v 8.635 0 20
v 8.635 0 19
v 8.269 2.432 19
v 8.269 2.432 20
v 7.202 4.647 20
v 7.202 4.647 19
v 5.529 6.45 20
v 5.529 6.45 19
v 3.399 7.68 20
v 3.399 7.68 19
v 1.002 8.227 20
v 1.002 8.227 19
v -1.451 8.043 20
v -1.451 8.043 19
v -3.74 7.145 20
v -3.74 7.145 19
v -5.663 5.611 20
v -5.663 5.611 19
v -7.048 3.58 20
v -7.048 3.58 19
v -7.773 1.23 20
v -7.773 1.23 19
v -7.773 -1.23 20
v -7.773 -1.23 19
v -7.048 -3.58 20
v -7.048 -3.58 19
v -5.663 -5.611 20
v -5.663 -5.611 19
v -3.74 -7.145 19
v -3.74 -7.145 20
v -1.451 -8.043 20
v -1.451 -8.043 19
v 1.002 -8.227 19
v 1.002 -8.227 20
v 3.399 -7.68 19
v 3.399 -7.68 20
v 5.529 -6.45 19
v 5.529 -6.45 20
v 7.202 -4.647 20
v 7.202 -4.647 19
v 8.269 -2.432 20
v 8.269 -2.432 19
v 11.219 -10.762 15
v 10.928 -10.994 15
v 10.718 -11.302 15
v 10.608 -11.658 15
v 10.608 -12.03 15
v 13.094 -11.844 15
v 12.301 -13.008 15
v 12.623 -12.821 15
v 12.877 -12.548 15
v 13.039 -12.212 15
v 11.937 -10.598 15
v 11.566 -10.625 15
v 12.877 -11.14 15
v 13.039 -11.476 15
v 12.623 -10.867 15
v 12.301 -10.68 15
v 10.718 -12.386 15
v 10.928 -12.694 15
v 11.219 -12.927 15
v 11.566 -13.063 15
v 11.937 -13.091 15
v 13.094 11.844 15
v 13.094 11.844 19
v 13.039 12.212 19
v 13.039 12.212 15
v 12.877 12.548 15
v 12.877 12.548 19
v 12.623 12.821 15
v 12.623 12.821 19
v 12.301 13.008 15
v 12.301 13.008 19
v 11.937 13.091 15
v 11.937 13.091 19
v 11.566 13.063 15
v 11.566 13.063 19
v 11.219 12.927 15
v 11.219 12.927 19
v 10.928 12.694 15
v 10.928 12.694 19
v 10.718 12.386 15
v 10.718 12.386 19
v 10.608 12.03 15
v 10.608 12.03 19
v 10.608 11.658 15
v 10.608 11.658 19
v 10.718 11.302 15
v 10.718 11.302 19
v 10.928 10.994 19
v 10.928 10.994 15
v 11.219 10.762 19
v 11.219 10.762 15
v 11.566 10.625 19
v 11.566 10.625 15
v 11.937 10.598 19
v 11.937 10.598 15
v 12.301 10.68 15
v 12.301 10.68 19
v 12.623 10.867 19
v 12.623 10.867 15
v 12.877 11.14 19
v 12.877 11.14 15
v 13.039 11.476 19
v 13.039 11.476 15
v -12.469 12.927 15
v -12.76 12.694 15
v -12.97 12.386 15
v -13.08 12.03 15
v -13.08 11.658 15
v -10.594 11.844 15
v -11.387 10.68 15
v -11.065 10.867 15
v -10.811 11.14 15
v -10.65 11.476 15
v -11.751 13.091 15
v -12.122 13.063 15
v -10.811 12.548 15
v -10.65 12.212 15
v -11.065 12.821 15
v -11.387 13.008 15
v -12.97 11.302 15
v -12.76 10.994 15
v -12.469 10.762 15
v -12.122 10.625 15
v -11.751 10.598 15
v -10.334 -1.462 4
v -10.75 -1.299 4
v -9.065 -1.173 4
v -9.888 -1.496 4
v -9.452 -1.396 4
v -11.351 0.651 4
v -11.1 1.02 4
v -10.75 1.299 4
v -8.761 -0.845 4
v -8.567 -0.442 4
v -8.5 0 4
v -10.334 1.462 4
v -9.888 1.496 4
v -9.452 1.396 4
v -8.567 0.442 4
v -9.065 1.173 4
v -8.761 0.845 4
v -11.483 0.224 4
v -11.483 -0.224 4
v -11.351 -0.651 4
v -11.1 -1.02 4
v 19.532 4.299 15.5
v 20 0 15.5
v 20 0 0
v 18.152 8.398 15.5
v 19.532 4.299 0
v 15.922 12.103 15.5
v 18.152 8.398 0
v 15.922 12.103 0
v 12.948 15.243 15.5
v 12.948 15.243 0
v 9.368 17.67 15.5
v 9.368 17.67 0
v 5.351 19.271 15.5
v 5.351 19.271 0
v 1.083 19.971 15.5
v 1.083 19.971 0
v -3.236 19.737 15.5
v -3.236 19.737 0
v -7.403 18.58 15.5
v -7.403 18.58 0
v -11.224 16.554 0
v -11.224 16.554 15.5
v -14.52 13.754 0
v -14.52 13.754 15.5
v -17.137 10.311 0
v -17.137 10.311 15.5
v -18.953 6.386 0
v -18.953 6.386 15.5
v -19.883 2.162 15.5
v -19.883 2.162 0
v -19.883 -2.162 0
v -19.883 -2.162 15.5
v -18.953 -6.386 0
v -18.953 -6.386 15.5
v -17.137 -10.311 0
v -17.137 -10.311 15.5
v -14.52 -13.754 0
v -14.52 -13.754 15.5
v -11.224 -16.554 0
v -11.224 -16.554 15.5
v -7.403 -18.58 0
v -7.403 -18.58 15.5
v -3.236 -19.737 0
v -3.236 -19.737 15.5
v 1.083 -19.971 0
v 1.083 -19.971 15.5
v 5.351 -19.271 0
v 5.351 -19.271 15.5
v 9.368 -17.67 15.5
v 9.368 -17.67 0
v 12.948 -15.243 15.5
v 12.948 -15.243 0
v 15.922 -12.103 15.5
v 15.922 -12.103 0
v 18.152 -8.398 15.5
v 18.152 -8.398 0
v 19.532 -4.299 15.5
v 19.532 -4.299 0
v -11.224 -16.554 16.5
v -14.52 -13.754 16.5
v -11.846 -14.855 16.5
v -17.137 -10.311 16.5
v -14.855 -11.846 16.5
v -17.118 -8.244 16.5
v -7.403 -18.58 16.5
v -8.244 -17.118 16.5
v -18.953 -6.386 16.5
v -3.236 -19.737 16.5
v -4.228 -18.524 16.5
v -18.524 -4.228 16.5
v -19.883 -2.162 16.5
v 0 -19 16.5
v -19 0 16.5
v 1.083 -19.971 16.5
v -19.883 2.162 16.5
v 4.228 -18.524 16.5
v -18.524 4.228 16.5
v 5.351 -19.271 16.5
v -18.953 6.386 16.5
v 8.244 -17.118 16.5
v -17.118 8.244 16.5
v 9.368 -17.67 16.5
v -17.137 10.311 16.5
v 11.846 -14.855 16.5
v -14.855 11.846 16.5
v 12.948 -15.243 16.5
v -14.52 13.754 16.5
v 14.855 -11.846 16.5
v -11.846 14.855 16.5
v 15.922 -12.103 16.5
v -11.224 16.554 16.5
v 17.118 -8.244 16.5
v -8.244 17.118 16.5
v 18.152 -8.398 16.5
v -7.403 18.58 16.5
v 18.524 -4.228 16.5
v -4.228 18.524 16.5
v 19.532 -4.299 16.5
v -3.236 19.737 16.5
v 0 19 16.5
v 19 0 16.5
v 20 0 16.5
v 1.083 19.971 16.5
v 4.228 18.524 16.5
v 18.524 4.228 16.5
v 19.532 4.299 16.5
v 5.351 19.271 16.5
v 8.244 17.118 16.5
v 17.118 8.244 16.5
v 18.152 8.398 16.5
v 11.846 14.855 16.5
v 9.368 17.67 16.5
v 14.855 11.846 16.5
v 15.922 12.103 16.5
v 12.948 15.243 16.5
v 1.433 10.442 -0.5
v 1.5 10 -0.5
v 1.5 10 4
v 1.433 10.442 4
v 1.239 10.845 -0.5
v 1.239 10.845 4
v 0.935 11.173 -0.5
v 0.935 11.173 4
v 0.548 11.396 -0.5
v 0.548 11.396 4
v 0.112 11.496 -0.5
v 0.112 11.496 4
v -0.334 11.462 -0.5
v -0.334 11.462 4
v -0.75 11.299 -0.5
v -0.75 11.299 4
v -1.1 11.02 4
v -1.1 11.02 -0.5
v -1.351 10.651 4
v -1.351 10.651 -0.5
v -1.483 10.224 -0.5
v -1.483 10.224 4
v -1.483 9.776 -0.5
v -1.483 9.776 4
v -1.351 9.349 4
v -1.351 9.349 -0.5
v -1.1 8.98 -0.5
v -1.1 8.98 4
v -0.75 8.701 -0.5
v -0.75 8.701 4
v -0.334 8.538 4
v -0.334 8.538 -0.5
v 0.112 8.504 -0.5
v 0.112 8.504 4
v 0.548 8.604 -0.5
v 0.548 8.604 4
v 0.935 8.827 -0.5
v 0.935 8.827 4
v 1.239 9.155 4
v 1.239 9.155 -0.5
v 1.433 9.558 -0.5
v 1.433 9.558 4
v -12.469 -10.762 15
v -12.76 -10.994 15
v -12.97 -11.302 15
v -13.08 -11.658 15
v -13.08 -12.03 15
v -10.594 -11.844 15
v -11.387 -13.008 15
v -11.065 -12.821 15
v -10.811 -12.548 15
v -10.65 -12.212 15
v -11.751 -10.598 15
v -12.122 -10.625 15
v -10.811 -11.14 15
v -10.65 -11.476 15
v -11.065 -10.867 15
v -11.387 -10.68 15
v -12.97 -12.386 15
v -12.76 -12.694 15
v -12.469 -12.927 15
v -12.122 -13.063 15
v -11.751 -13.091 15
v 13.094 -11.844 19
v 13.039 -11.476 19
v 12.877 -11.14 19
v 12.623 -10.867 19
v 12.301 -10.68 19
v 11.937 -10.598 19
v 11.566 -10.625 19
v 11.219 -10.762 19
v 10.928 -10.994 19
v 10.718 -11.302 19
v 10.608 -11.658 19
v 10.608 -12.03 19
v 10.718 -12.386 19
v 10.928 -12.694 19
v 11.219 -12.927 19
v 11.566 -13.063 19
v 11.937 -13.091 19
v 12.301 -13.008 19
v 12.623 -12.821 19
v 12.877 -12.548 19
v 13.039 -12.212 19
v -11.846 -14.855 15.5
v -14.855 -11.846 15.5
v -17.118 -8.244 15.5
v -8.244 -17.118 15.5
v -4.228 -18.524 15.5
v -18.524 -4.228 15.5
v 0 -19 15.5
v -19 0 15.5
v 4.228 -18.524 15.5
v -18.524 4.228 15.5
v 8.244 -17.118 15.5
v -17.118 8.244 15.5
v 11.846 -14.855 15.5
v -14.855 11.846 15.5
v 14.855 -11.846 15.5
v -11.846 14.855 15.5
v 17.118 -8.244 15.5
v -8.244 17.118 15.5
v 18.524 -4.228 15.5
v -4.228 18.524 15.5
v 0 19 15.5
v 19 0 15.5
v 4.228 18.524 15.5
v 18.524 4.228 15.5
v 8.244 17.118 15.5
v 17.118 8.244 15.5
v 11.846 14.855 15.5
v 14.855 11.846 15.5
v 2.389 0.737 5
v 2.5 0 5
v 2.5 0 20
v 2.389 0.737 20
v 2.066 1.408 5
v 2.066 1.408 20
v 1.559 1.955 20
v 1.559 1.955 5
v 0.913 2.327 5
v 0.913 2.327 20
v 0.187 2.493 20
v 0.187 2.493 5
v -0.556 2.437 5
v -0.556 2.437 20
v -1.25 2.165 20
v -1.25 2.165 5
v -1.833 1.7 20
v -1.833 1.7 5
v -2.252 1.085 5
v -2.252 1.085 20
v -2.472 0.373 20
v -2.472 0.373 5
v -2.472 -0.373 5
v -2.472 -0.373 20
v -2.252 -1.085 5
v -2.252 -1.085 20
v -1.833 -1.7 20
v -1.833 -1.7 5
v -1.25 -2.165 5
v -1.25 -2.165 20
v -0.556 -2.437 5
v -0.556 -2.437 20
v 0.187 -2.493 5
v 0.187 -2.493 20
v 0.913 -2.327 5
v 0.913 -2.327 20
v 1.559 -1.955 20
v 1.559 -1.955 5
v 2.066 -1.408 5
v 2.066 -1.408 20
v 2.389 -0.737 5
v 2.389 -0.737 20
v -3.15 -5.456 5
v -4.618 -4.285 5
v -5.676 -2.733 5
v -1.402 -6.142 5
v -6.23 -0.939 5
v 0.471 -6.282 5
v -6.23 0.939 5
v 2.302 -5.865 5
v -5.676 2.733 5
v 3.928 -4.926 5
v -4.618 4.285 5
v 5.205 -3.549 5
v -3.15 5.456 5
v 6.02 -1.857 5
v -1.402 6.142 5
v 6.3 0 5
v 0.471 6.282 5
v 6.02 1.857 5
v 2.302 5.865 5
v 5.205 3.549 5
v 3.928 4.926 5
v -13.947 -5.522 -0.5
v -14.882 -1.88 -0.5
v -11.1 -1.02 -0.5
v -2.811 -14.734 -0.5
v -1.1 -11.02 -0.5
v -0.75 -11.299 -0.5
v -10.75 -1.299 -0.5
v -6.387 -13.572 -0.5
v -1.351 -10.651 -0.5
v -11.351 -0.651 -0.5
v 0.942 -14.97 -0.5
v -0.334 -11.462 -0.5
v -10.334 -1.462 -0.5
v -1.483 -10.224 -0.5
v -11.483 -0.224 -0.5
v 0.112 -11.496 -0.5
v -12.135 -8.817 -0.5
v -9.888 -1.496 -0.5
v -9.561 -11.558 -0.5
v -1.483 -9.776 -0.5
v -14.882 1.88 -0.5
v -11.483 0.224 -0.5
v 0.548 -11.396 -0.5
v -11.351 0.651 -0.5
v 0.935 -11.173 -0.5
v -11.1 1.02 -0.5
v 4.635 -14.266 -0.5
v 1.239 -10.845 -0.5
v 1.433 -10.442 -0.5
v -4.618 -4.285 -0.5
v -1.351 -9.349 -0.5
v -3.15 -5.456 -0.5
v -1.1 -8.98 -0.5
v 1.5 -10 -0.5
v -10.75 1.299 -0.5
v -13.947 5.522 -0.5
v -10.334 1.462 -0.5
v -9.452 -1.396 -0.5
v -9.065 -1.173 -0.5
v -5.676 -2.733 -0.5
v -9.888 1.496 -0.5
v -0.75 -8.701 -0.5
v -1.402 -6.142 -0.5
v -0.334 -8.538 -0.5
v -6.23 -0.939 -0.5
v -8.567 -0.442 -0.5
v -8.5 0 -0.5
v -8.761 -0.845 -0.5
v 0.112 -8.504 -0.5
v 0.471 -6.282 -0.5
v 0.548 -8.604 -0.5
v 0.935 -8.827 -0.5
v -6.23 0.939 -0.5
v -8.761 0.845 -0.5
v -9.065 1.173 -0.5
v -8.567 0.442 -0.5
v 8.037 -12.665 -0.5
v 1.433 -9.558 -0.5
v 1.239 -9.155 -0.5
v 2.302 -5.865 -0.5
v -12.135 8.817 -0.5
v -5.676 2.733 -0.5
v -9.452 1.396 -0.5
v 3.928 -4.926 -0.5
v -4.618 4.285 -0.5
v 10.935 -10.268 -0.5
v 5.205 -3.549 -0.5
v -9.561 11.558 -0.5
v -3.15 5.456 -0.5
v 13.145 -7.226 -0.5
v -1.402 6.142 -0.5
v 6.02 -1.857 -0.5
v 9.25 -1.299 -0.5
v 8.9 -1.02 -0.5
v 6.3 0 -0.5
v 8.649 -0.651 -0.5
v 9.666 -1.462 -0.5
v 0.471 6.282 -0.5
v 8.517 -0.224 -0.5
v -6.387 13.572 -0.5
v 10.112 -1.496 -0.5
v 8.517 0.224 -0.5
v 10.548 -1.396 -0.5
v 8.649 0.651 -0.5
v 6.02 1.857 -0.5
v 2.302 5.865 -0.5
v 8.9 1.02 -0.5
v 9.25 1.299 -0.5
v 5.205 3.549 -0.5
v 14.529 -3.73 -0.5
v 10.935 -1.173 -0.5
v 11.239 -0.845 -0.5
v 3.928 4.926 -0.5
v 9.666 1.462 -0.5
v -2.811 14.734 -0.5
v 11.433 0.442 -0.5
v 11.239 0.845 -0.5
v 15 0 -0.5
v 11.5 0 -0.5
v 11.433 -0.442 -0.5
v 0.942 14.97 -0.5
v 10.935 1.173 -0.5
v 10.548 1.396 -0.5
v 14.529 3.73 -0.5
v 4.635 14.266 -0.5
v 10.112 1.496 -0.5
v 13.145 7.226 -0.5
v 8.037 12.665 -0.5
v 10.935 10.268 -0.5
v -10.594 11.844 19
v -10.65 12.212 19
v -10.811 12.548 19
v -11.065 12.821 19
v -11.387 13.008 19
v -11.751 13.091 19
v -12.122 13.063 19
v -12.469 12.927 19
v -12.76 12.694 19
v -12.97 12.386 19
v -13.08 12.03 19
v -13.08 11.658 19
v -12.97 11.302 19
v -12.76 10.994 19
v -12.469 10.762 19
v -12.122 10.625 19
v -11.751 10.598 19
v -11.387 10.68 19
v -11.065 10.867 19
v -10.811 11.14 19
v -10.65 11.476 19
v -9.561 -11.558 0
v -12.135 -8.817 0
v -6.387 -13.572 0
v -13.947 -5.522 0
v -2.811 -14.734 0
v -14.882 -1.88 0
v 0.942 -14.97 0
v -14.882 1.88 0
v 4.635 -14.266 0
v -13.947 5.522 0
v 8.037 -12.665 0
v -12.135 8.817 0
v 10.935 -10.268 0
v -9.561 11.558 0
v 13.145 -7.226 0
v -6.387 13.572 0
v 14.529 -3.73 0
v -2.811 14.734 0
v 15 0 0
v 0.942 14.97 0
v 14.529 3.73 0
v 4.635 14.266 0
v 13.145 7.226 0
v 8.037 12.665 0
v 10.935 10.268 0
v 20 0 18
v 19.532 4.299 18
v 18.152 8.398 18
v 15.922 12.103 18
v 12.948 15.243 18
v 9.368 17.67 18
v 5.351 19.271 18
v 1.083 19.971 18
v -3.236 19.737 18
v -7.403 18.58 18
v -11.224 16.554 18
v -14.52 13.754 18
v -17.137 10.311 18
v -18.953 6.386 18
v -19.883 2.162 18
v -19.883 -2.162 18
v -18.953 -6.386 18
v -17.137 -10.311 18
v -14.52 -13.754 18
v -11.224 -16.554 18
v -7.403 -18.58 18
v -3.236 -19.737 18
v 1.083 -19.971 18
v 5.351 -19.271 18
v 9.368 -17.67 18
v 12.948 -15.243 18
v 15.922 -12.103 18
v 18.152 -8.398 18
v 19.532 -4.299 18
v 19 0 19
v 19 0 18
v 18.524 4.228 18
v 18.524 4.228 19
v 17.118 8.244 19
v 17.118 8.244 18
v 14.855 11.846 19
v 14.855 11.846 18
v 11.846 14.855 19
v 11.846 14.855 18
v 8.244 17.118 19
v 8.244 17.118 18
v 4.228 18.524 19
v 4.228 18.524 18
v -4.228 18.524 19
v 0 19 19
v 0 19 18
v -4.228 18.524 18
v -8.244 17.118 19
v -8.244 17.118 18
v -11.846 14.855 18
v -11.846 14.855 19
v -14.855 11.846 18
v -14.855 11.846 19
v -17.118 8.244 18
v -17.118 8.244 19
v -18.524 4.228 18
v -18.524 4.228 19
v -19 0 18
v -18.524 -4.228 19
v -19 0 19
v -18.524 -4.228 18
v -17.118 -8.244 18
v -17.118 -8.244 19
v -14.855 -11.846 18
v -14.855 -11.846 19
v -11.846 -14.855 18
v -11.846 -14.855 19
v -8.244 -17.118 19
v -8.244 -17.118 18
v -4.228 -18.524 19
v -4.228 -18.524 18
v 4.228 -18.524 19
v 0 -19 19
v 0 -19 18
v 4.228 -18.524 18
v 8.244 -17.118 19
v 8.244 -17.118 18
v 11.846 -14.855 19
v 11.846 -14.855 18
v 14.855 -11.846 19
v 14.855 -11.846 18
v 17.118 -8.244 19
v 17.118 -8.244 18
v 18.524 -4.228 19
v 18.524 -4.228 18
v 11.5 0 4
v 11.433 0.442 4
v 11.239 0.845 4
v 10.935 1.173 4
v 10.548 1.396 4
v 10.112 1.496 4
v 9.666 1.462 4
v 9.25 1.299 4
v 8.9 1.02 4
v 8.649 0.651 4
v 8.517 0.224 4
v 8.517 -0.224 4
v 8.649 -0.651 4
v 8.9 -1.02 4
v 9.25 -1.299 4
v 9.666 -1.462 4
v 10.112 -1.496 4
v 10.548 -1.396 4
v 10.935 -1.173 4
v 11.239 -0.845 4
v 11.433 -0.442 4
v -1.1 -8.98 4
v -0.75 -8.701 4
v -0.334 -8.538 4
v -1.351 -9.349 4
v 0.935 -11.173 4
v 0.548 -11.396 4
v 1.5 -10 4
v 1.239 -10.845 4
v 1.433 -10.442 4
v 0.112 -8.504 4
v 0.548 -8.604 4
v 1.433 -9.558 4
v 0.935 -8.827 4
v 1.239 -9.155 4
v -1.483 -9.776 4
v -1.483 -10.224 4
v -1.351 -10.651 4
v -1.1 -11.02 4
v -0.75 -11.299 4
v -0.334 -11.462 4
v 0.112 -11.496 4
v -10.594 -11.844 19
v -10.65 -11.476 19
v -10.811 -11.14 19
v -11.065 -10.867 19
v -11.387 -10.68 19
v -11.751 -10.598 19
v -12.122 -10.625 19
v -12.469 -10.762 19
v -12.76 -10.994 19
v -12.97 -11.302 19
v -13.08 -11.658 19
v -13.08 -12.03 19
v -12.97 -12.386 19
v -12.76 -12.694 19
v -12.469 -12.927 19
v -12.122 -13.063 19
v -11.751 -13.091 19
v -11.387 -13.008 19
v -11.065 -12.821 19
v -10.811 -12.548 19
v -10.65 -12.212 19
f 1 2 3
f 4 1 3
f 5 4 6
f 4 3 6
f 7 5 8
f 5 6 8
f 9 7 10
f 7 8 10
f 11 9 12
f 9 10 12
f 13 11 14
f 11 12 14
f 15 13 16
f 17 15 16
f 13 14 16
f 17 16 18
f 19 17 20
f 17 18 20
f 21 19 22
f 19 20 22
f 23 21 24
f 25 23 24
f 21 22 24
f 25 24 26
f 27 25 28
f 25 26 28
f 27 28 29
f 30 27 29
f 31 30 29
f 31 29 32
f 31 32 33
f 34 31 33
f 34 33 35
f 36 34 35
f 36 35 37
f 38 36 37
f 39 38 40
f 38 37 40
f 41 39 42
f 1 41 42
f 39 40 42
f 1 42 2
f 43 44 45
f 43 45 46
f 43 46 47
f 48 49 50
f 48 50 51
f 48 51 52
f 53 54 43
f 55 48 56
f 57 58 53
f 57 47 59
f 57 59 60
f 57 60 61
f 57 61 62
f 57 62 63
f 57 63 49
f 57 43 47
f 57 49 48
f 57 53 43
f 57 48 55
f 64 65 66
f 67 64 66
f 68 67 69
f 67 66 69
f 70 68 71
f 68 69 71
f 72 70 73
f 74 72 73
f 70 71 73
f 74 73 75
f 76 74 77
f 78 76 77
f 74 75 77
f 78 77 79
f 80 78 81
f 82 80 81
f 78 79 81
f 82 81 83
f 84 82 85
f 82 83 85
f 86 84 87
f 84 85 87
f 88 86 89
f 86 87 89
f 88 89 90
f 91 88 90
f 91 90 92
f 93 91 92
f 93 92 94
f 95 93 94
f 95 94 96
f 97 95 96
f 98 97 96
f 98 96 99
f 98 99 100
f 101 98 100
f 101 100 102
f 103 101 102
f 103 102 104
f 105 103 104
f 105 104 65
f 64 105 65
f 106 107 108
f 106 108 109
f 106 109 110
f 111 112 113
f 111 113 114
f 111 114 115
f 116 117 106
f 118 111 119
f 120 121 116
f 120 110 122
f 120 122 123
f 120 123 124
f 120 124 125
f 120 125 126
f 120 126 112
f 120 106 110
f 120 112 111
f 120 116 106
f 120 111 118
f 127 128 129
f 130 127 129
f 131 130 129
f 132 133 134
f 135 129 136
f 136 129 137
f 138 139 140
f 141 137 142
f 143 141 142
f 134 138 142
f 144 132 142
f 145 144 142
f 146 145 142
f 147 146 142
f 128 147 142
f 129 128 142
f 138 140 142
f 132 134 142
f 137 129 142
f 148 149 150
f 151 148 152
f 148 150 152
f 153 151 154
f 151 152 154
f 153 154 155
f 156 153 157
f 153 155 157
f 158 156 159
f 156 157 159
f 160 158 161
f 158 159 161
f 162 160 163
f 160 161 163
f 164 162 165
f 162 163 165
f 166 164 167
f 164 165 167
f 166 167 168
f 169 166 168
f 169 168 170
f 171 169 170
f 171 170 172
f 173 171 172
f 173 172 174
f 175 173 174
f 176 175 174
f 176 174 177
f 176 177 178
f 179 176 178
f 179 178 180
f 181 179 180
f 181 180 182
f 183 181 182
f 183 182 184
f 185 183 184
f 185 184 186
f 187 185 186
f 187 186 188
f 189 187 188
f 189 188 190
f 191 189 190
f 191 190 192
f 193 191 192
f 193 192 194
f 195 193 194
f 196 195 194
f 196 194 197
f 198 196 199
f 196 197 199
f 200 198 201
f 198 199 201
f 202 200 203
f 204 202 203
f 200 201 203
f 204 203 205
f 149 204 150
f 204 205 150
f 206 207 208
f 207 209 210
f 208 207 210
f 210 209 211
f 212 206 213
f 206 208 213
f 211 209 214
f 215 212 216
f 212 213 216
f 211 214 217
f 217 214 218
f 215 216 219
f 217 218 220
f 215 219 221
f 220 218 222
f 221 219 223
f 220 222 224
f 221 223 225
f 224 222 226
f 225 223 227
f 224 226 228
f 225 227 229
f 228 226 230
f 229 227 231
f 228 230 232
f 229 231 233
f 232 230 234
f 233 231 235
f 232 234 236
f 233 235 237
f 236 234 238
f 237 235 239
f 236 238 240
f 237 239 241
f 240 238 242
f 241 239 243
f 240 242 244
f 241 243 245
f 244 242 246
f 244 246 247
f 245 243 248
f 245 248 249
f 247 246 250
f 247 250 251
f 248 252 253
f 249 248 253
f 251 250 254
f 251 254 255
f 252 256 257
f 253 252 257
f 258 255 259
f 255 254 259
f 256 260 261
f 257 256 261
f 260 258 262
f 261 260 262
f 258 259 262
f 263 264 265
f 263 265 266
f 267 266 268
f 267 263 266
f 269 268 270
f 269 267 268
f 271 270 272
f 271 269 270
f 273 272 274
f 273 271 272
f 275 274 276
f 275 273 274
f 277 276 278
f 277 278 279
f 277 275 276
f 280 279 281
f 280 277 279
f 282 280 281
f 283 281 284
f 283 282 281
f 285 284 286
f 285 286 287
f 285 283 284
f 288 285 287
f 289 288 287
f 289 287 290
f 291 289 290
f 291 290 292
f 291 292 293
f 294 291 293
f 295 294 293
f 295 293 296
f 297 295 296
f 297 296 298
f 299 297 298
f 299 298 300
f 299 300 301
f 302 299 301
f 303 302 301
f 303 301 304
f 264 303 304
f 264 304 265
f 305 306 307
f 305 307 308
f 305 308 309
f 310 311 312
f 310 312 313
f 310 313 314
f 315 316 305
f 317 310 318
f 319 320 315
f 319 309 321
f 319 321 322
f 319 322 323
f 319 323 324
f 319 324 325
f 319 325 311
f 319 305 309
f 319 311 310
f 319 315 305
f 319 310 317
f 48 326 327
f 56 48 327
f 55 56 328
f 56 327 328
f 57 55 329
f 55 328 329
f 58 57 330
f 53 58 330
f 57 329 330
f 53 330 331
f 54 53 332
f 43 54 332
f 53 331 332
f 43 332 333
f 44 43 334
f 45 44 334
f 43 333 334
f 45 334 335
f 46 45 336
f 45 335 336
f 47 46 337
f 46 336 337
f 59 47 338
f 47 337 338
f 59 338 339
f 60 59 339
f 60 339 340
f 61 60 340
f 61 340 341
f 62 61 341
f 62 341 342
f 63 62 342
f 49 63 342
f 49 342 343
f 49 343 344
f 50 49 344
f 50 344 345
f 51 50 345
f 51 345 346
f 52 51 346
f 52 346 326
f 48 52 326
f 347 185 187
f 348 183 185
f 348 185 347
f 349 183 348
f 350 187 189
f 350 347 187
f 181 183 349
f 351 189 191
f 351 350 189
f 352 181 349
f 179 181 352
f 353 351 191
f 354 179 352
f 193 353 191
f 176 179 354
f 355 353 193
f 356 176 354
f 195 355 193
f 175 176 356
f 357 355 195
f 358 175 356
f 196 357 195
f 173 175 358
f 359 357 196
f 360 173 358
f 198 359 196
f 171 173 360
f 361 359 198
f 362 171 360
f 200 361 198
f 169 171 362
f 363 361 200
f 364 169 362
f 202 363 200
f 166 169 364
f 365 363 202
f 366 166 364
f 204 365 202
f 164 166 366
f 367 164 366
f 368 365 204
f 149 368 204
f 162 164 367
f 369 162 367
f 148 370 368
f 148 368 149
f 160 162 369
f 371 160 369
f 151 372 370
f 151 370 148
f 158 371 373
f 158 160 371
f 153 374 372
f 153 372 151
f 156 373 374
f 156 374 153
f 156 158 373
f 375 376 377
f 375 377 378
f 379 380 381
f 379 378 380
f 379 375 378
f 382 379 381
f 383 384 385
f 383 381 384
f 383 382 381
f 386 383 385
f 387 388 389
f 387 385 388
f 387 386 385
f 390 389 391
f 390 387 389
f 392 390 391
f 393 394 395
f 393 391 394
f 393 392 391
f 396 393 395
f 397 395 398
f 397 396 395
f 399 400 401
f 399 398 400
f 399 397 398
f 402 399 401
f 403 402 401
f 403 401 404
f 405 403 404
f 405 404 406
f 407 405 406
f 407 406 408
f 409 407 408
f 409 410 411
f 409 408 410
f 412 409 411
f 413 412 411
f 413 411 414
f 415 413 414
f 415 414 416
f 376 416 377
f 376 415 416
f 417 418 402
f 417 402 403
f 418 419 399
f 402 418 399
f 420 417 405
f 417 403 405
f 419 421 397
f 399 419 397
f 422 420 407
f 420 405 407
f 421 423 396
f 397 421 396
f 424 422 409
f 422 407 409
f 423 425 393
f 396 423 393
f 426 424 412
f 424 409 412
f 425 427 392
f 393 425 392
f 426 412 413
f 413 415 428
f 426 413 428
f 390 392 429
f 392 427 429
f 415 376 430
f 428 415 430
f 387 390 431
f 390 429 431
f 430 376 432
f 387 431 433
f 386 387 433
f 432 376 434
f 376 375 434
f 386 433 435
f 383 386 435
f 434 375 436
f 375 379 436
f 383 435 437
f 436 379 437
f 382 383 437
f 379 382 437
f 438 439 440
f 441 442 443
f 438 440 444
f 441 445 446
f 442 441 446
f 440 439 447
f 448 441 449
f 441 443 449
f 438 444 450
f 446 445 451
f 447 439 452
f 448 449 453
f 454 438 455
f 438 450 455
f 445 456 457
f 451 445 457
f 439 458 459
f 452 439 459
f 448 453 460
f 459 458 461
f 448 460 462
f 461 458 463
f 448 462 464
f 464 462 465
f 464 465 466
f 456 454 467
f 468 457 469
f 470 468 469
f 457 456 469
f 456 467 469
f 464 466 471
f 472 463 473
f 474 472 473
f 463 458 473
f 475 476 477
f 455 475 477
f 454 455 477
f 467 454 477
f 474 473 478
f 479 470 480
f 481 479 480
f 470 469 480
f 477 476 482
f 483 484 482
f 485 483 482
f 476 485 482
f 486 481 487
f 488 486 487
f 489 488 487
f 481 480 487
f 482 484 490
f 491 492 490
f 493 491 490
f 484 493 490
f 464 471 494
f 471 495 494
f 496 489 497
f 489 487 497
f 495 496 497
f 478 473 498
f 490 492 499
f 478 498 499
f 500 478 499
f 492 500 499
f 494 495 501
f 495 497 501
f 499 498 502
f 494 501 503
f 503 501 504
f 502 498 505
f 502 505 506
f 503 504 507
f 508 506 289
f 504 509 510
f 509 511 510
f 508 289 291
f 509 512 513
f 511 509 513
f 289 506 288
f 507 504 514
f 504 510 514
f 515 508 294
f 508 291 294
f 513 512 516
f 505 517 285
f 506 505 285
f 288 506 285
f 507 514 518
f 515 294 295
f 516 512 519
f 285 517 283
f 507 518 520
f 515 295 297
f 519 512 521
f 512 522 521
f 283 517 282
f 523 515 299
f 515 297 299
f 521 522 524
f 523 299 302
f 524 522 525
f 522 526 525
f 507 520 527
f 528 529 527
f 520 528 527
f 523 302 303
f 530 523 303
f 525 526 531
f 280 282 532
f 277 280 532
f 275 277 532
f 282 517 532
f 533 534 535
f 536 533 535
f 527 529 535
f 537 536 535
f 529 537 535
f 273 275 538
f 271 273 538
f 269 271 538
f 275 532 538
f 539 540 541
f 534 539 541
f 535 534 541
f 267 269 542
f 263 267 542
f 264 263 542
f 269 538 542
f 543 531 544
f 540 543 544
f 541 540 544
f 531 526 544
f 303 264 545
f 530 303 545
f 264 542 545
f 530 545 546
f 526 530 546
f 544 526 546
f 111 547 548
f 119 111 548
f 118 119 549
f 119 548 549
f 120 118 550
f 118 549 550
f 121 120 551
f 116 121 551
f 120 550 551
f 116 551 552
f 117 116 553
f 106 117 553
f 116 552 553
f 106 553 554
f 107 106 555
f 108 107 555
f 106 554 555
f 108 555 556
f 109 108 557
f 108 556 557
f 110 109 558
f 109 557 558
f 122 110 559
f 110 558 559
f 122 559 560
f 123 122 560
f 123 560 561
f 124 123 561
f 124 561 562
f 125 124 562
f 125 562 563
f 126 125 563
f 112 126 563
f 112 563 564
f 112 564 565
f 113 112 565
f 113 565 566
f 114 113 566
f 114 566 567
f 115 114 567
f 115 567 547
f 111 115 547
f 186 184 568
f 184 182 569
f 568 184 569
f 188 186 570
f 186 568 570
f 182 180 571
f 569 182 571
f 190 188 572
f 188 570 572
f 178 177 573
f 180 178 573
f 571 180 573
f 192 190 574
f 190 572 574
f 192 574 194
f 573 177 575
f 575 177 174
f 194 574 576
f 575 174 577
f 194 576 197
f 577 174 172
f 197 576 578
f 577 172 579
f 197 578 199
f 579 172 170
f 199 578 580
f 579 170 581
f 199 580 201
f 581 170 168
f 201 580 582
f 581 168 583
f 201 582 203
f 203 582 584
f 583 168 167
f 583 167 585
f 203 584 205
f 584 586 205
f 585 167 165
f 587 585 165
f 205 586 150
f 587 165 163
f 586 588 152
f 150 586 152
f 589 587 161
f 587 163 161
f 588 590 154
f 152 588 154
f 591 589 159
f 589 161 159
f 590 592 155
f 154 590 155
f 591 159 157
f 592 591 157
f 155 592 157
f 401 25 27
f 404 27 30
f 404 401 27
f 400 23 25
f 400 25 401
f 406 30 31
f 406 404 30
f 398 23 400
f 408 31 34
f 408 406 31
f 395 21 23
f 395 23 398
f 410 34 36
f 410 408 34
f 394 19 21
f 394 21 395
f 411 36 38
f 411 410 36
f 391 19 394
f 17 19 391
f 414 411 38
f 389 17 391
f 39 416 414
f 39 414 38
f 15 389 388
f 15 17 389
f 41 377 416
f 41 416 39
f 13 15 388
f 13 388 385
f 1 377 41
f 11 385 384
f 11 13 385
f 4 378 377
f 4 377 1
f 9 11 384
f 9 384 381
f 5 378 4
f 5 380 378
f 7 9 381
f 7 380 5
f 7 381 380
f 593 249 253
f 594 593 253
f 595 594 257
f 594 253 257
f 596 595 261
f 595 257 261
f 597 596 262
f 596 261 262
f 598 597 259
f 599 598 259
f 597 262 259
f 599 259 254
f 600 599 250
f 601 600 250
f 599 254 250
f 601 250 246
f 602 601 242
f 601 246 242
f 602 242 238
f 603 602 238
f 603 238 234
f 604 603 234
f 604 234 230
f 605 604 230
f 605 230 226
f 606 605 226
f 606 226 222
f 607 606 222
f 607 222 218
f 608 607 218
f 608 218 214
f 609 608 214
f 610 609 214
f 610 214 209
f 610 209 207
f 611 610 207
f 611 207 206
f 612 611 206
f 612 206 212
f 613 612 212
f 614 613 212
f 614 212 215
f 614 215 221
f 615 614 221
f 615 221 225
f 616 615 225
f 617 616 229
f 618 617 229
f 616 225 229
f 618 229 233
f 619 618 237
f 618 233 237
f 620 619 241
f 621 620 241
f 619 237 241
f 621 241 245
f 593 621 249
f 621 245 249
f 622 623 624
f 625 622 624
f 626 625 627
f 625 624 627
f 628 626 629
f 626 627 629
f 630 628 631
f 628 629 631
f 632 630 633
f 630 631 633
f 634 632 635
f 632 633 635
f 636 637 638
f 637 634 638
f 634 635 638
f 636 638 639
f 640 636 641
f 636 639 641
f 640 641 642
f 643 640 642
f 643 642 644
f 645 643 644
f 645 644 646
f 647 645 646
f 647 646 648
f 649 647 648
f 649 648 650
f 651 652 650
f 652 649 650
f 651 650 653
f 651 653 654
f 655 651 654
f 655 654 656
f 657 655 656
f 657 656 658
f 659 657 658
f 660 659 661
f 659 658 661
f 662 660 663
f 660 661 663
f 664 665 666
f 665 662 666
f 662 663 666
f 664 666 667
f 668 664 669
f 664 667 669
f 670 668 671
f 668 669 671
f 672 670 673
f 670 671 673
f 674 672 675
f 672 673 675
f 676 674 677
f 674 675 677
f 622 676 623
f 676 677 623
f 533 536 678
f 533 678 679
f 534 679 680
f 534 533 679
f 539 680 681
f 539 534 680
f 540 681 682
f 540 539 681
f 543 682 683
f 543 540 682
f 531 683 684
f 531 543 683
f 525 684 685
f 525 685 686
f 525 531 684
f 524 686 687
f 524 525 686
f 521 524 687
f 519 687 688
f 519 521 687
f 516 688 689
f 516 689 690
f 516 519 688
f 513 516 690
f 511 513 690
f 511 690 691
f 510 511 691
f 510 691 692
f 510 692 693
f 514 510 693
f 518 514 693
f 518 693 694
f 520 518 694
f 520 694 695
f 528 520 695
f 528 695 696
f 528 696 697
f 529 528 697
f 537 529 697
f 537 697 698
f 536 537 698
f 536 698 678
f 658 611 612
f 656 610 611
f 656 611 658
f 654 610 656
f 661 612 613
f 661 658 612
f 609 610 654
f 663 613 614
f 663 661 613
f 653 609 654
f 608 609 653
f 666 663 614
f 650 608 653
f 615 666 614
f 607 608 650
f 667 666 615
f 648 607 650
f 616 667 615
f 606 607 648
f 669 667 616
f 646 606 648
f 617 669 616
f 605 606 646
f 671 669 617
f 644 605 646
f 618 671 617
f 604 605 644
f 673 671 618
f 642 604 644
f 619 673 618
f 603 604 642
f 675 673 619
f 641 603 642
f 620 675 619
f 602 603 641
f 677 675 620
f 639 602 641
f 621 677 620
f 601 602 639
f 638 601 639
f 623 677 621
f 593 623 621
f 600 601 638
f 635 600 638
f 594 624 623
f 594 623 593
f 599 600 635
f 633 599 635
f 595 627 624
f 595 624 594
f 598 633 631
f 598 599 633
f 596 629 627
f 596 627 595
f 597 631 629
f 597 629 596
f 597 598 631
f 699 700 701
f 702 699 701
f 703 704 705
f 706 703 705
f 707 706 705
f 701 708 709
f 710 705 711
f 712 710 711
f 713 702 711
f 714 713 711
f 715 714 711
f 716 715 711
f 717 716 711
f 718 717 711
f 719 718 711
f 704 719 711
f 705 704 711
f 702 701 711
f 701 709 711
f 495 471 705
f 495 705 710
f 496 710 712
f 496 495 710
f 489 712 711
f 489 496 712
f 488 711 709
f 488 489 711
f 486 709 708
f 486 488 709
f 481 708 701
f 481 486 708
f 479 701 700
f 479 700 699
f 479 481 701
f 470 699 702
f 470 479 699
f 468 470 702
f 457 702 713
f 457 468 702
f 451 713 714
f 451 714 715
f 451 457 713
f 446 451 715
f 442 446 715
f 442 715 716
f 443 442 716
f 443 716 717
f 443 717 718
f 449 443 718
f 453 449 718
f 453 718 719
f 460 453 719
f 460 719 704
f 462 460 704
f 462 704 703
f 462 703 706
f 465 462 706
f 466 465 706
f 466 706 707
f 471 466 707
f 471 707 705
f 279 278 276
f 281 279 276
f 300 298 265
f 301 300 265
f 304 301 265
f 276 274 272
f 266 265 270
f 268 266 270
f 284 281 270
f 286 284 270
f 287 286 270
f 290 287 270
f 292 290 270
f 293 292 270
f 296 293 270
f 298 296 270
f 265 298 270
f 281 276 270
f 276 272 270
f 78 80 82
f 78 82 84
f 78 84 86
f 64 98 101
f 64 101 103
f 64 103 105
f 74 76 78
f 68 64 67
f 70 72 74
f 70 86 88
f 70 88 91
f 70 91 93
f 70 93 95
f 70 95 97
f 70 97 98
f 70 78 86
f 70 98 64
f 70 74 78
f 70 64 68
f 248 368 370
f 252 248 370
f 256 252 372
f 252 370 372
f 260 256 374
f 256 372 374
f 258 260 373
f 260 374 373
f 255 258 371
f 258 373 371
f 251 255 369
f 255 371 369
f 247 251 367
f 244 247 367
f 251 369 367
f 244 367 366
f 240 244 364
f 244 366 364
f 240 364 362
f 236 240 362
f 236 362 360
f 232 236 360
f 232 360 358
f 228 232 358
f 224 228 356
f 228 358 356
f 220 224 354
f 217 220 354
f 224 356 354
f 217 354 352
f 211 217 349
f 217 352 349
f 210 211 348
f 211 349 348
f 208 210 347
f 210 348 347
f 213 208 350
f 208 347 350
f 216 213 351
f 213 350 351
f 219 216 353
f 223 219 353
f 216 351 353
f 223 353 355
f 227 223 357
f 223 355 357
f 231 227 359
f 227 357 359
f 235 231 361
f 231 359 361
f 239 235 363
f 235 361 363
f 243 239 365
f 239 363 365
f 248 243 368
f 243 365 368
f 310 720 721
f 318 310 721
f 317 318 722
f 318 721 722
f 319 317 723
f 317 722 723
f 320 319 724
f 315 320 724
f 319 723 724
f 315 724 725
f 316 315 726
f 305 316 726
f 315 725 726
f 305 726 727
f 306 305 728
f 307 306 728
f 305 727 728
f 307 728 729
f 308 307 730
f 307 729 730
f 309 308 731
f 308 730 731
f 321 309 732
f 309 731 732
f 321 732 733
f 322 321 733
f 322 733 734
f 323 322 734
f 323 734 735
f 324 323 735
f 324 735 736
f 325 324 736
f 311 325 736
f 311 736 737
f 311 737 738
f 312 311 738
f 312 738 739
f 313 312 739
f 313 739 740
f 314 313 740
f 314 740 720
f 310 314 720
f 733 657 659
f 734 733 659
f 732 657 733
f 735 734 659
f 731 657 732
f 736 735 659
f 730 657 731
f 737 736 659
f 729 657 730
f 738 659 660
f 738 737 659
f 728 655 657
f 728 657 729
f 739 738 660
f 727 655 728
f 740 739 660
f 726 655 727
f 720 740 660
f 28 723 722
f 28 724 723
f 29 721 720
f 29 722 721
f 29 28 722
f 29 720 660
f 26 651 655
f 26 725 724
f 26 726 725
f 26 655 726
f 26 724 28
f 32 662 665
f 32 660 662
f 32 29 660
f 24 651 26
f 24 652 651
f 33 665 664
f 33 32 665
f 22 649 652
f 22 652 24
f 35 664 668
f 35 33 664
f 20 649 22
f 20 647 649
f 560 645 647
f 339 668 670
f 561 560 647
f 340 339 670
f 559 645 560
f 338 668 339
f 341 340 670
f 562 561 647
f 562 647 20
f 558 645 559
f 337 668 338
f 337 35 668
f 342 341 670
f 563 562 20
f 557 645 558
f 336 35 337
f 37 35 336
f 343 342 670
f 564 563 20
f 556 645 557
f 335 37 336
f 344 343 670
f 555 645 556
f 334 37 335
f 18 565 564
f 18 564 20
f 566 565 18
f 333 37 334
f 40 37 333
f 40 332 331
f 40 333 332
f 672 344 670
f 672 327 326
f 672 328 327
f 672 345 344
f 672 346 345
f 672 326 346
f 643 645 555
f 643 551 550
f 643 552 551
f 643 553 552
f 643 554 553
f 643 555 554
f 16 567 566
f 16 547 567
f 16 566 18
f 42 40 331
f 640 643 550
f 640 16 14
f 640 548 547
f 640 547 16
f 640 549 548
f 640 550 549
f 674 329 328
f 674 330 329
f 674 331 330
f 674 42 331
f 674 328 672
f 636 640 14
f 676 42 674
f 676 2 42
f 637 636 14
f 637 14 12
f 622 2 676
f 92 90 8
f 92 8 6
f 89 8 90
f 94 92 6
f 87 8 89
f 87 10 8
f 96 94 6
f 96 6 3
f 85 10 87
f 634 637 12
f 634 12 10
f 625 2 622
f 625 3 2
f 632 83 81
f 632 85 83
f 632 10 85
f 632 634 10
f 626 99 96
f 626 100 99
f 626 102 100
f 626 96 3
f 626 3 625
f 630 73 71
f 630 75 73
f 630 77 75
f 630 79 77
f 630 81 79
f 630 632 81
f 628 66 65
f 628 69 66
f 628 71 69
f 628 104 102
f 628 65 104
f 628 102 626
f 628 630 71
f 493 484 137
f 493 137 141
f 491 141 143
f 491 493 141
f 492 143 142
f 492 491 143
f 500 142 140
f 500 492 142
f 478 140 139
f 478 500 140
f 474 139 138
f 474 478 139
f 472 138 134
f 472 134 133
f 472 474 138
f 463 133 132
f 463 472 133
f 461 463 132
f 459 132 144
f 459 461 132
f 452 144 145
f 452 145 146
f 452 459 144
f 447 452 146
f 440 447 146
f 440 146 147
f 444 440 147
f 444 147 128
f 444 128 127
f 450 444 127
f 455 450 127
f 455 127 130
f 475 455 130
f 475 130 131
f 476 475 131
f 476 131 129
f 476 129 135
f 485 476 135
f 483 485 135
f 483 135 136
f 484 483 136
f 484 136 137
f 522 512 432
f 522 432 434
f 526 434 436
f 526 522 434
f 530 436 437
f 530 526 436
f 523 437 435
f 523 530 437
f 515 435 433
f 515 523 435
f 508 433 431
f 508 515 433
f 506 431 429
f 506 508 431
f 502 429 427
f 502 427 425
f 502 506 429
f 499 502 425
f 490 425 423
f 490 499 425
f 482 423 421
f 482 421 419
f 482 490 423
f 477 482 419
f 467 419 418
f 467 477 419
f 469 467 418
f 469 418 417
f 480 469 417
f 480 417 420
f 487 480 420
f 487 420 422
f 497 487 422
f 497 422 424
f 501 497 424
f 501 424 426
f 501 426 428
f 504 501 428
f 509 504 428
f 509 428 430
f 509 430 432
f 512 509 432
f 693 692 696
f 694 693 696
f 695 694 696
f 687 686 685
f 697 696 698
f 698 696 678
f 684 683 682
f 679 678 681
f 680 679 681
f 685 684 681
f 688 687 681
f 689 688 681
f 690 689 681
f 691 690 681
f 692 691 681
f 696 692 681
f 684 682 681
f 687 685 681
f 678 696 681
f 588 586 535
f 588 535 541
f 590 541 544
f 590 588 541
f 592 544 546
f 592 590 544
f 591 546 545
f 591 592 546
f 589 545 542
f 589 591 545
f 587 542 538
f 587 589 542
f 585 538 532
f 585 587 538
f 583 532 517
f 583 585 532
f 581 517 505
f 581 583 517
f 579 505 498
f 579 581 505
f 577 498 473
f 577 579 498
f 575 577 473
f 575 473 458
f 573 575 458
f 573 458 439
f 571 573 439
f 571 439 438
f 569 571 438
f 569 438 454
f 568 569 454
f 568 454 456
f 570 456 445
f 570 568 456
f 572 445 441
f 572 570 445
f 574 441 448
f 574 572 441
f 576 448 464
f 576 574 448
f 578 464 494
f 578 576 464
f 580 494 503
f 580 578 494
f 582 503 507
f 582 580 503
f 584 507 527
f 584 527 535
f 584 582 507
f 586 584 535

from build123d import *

# Parameters (mm, degrees)
SKETCH_1_R               = 20
EXTRUDE_1_DEPTH          = 20
SKETCH_2_R               = 15
EXTRUDE_2_DEPTH          = 0.5
CUT_EXTRUDE_2_DEPTH      = 4
CUT_EXTRUDE_2_DEPTH_BACK = 4
SKETCH_3_R               = 1.5
CUT_EXTRUDE_START        = -1
SKETCH_4_R               = 20
SKETCH_4_R_2             = 8.25
CUT_EXTRUDE_3_DEPTH      = 1
CUT_EXTRUDE_START_2      = -2
SKETCH_5_R               = 20
SKETCH_5_R_2             = 19
CUT_EXTRUDE_4_DEPTH      = 2
SKETCH_6_R               = 20
SKETCH_6_R_2             = 19
CUT_EXTRUDE_5_DEPTH      = 1
SKETCH_7_R               = 1.25
CUT_EXTRUDE_6_DEPTH      = 5
CUT_EXTRUDE_7_DEPTH      = 5
CUT_EXTRUDE_7_DEPTH_BACK = 35.641016151
SKETCH_8_R               = 6.3
CUT_EXTRUDE_8_DEPTH      = 35.641016151
CUT_EXTRUDE_8_DEPTH_BACK = 35.641016151
SKETCH_9_R               = 2.5


with BuildPart() as part:
    # 草图1 → 凸台-拉伸1 (new body)
    with BuildSketch(Plane.XY):
        Circle(SKETCH_1_R)
    extrude(amount=EXTRUDE_1_DEPTH)

    # 草图2 → 凸台-拉伸2 (add)
    with BuildSketch(Plane.XY):
        Circle(SKETCH_2_R)
    extrude(amount=-EXTRUDE_2_DEPTH)

    # 草图3 → 切除-拉伸2 (cut, two sides: drawn at the far end of the back side and taken through both)
    with BuildSketch(Plane.XY.offset(-CUT_EXTRUDE_2_DEPTH_BACK)):
        with Locations((0, 10)):
            Circle(SKETCH_3_R)
        with Locations((10, 0)):
            Circle(SKETCH_3_R)
        with Locations((0, -10)):
            Circle(SKETCH_3_R)
        with Locations((-10, 0)):
            Circle(SKETCH_3_R)
    extrude(amount=CUT_EXTRUDE_2_DEPTH + CUT_EXTRUDE_2_DEPTH_BACK, mode=Mode.SUBTRACT)

    # 草图4 → 切除-拉伸3 (cut)
    with BuildSketch(Plane.XY.offset(20).offset(CUT_EXTRUDE_START)):
        Circle(SKETCH_4_R)
        with Locations((0.385039993, 0)):
            Circle(SKETCH_4_R_2, mode=Mode.SUBTRACT)
    extrude(amount=CUT_EXTRUDE_3_DEPTH, mode=Mode.SUBTRACT)

    # 草图5 → 切除-拉伸4 (cut)
    with BuildSketch(Plane.XY.offset(20).offset(CUT_EXTRUDE_START_2)):
        Circle(SKETCH_5_R)
        Circle(SKETCH_5_R_2, mode=Mode.SUBTRACT)
    extrude(amount=CUT_EXTRUDE_4_DEPTH, mode=Mode.SUBTRACT)

    # 草图6 → 切除-拉伸5 (cut)
    with BuildSketch(Plane.XY.offset(16.5).offset(CUT_EXTRUDE_START)):
        Circle(SKETCH_6_R)
        Circle(SKETCH_6_R_2, mode=Mode.SUBTRACT)
    extrude(amount=CUT_EXTRUDE_5_DEPTH, mode=Mode.SUBTRACT)

    # 草图7 → 切除-拉伸6 (cut)
    with BuildSketch(Plane.XY.offset(20)):
        with Locations((-11.844038585, -11.844038585)):
            Circle(SKETCH_7_R)
        with Locations((-11.844038585, 11.844038585)):
            Circle(SKETCH_7_R)
        with Locations((11.844038585, 11.844038585)):
            Circle(SKETCH_7_R)
        with Locations((11.844038585, -11.844038585)):
            Circle(SKETCH_7_R)
    extrude(amount=-CUT_EXTRUDE_6_DEPTH, mode=Mode.SUBTRACT)

    # 草图8 → 切除-拉伸7 (cut, two sides: drawn at the far end of the back side and taken through both)
    with BuildSketch(Plane.XY.offset(-CUT_EXTRUDE_7_DEPTH_BACK)):
        Circle(SKETCH_8_R)
    extrude(amount=CUT_EXTRUDE_7_DEPTH + CUT_EXTRUDE_7_DEPTH_BACK, mode=Mode.SUBTRACT)

    # 草图9 → 切除-拉伸8 (cut, two sides: drawn at the far end of the back side and taken through both)
    with BuildSketch(Plane.XY.offset(-CUT_EXTRUDE_8_DEPTH_BACK)):
        Circle(SKETCH_9_R)
    extrude(amount=CUT_EXTRUDE_8_DEPTH + CUT_EXTRUDE_8_DEPTH_BACK, mode=Mode.SUBTRACT)


solid = part.part
